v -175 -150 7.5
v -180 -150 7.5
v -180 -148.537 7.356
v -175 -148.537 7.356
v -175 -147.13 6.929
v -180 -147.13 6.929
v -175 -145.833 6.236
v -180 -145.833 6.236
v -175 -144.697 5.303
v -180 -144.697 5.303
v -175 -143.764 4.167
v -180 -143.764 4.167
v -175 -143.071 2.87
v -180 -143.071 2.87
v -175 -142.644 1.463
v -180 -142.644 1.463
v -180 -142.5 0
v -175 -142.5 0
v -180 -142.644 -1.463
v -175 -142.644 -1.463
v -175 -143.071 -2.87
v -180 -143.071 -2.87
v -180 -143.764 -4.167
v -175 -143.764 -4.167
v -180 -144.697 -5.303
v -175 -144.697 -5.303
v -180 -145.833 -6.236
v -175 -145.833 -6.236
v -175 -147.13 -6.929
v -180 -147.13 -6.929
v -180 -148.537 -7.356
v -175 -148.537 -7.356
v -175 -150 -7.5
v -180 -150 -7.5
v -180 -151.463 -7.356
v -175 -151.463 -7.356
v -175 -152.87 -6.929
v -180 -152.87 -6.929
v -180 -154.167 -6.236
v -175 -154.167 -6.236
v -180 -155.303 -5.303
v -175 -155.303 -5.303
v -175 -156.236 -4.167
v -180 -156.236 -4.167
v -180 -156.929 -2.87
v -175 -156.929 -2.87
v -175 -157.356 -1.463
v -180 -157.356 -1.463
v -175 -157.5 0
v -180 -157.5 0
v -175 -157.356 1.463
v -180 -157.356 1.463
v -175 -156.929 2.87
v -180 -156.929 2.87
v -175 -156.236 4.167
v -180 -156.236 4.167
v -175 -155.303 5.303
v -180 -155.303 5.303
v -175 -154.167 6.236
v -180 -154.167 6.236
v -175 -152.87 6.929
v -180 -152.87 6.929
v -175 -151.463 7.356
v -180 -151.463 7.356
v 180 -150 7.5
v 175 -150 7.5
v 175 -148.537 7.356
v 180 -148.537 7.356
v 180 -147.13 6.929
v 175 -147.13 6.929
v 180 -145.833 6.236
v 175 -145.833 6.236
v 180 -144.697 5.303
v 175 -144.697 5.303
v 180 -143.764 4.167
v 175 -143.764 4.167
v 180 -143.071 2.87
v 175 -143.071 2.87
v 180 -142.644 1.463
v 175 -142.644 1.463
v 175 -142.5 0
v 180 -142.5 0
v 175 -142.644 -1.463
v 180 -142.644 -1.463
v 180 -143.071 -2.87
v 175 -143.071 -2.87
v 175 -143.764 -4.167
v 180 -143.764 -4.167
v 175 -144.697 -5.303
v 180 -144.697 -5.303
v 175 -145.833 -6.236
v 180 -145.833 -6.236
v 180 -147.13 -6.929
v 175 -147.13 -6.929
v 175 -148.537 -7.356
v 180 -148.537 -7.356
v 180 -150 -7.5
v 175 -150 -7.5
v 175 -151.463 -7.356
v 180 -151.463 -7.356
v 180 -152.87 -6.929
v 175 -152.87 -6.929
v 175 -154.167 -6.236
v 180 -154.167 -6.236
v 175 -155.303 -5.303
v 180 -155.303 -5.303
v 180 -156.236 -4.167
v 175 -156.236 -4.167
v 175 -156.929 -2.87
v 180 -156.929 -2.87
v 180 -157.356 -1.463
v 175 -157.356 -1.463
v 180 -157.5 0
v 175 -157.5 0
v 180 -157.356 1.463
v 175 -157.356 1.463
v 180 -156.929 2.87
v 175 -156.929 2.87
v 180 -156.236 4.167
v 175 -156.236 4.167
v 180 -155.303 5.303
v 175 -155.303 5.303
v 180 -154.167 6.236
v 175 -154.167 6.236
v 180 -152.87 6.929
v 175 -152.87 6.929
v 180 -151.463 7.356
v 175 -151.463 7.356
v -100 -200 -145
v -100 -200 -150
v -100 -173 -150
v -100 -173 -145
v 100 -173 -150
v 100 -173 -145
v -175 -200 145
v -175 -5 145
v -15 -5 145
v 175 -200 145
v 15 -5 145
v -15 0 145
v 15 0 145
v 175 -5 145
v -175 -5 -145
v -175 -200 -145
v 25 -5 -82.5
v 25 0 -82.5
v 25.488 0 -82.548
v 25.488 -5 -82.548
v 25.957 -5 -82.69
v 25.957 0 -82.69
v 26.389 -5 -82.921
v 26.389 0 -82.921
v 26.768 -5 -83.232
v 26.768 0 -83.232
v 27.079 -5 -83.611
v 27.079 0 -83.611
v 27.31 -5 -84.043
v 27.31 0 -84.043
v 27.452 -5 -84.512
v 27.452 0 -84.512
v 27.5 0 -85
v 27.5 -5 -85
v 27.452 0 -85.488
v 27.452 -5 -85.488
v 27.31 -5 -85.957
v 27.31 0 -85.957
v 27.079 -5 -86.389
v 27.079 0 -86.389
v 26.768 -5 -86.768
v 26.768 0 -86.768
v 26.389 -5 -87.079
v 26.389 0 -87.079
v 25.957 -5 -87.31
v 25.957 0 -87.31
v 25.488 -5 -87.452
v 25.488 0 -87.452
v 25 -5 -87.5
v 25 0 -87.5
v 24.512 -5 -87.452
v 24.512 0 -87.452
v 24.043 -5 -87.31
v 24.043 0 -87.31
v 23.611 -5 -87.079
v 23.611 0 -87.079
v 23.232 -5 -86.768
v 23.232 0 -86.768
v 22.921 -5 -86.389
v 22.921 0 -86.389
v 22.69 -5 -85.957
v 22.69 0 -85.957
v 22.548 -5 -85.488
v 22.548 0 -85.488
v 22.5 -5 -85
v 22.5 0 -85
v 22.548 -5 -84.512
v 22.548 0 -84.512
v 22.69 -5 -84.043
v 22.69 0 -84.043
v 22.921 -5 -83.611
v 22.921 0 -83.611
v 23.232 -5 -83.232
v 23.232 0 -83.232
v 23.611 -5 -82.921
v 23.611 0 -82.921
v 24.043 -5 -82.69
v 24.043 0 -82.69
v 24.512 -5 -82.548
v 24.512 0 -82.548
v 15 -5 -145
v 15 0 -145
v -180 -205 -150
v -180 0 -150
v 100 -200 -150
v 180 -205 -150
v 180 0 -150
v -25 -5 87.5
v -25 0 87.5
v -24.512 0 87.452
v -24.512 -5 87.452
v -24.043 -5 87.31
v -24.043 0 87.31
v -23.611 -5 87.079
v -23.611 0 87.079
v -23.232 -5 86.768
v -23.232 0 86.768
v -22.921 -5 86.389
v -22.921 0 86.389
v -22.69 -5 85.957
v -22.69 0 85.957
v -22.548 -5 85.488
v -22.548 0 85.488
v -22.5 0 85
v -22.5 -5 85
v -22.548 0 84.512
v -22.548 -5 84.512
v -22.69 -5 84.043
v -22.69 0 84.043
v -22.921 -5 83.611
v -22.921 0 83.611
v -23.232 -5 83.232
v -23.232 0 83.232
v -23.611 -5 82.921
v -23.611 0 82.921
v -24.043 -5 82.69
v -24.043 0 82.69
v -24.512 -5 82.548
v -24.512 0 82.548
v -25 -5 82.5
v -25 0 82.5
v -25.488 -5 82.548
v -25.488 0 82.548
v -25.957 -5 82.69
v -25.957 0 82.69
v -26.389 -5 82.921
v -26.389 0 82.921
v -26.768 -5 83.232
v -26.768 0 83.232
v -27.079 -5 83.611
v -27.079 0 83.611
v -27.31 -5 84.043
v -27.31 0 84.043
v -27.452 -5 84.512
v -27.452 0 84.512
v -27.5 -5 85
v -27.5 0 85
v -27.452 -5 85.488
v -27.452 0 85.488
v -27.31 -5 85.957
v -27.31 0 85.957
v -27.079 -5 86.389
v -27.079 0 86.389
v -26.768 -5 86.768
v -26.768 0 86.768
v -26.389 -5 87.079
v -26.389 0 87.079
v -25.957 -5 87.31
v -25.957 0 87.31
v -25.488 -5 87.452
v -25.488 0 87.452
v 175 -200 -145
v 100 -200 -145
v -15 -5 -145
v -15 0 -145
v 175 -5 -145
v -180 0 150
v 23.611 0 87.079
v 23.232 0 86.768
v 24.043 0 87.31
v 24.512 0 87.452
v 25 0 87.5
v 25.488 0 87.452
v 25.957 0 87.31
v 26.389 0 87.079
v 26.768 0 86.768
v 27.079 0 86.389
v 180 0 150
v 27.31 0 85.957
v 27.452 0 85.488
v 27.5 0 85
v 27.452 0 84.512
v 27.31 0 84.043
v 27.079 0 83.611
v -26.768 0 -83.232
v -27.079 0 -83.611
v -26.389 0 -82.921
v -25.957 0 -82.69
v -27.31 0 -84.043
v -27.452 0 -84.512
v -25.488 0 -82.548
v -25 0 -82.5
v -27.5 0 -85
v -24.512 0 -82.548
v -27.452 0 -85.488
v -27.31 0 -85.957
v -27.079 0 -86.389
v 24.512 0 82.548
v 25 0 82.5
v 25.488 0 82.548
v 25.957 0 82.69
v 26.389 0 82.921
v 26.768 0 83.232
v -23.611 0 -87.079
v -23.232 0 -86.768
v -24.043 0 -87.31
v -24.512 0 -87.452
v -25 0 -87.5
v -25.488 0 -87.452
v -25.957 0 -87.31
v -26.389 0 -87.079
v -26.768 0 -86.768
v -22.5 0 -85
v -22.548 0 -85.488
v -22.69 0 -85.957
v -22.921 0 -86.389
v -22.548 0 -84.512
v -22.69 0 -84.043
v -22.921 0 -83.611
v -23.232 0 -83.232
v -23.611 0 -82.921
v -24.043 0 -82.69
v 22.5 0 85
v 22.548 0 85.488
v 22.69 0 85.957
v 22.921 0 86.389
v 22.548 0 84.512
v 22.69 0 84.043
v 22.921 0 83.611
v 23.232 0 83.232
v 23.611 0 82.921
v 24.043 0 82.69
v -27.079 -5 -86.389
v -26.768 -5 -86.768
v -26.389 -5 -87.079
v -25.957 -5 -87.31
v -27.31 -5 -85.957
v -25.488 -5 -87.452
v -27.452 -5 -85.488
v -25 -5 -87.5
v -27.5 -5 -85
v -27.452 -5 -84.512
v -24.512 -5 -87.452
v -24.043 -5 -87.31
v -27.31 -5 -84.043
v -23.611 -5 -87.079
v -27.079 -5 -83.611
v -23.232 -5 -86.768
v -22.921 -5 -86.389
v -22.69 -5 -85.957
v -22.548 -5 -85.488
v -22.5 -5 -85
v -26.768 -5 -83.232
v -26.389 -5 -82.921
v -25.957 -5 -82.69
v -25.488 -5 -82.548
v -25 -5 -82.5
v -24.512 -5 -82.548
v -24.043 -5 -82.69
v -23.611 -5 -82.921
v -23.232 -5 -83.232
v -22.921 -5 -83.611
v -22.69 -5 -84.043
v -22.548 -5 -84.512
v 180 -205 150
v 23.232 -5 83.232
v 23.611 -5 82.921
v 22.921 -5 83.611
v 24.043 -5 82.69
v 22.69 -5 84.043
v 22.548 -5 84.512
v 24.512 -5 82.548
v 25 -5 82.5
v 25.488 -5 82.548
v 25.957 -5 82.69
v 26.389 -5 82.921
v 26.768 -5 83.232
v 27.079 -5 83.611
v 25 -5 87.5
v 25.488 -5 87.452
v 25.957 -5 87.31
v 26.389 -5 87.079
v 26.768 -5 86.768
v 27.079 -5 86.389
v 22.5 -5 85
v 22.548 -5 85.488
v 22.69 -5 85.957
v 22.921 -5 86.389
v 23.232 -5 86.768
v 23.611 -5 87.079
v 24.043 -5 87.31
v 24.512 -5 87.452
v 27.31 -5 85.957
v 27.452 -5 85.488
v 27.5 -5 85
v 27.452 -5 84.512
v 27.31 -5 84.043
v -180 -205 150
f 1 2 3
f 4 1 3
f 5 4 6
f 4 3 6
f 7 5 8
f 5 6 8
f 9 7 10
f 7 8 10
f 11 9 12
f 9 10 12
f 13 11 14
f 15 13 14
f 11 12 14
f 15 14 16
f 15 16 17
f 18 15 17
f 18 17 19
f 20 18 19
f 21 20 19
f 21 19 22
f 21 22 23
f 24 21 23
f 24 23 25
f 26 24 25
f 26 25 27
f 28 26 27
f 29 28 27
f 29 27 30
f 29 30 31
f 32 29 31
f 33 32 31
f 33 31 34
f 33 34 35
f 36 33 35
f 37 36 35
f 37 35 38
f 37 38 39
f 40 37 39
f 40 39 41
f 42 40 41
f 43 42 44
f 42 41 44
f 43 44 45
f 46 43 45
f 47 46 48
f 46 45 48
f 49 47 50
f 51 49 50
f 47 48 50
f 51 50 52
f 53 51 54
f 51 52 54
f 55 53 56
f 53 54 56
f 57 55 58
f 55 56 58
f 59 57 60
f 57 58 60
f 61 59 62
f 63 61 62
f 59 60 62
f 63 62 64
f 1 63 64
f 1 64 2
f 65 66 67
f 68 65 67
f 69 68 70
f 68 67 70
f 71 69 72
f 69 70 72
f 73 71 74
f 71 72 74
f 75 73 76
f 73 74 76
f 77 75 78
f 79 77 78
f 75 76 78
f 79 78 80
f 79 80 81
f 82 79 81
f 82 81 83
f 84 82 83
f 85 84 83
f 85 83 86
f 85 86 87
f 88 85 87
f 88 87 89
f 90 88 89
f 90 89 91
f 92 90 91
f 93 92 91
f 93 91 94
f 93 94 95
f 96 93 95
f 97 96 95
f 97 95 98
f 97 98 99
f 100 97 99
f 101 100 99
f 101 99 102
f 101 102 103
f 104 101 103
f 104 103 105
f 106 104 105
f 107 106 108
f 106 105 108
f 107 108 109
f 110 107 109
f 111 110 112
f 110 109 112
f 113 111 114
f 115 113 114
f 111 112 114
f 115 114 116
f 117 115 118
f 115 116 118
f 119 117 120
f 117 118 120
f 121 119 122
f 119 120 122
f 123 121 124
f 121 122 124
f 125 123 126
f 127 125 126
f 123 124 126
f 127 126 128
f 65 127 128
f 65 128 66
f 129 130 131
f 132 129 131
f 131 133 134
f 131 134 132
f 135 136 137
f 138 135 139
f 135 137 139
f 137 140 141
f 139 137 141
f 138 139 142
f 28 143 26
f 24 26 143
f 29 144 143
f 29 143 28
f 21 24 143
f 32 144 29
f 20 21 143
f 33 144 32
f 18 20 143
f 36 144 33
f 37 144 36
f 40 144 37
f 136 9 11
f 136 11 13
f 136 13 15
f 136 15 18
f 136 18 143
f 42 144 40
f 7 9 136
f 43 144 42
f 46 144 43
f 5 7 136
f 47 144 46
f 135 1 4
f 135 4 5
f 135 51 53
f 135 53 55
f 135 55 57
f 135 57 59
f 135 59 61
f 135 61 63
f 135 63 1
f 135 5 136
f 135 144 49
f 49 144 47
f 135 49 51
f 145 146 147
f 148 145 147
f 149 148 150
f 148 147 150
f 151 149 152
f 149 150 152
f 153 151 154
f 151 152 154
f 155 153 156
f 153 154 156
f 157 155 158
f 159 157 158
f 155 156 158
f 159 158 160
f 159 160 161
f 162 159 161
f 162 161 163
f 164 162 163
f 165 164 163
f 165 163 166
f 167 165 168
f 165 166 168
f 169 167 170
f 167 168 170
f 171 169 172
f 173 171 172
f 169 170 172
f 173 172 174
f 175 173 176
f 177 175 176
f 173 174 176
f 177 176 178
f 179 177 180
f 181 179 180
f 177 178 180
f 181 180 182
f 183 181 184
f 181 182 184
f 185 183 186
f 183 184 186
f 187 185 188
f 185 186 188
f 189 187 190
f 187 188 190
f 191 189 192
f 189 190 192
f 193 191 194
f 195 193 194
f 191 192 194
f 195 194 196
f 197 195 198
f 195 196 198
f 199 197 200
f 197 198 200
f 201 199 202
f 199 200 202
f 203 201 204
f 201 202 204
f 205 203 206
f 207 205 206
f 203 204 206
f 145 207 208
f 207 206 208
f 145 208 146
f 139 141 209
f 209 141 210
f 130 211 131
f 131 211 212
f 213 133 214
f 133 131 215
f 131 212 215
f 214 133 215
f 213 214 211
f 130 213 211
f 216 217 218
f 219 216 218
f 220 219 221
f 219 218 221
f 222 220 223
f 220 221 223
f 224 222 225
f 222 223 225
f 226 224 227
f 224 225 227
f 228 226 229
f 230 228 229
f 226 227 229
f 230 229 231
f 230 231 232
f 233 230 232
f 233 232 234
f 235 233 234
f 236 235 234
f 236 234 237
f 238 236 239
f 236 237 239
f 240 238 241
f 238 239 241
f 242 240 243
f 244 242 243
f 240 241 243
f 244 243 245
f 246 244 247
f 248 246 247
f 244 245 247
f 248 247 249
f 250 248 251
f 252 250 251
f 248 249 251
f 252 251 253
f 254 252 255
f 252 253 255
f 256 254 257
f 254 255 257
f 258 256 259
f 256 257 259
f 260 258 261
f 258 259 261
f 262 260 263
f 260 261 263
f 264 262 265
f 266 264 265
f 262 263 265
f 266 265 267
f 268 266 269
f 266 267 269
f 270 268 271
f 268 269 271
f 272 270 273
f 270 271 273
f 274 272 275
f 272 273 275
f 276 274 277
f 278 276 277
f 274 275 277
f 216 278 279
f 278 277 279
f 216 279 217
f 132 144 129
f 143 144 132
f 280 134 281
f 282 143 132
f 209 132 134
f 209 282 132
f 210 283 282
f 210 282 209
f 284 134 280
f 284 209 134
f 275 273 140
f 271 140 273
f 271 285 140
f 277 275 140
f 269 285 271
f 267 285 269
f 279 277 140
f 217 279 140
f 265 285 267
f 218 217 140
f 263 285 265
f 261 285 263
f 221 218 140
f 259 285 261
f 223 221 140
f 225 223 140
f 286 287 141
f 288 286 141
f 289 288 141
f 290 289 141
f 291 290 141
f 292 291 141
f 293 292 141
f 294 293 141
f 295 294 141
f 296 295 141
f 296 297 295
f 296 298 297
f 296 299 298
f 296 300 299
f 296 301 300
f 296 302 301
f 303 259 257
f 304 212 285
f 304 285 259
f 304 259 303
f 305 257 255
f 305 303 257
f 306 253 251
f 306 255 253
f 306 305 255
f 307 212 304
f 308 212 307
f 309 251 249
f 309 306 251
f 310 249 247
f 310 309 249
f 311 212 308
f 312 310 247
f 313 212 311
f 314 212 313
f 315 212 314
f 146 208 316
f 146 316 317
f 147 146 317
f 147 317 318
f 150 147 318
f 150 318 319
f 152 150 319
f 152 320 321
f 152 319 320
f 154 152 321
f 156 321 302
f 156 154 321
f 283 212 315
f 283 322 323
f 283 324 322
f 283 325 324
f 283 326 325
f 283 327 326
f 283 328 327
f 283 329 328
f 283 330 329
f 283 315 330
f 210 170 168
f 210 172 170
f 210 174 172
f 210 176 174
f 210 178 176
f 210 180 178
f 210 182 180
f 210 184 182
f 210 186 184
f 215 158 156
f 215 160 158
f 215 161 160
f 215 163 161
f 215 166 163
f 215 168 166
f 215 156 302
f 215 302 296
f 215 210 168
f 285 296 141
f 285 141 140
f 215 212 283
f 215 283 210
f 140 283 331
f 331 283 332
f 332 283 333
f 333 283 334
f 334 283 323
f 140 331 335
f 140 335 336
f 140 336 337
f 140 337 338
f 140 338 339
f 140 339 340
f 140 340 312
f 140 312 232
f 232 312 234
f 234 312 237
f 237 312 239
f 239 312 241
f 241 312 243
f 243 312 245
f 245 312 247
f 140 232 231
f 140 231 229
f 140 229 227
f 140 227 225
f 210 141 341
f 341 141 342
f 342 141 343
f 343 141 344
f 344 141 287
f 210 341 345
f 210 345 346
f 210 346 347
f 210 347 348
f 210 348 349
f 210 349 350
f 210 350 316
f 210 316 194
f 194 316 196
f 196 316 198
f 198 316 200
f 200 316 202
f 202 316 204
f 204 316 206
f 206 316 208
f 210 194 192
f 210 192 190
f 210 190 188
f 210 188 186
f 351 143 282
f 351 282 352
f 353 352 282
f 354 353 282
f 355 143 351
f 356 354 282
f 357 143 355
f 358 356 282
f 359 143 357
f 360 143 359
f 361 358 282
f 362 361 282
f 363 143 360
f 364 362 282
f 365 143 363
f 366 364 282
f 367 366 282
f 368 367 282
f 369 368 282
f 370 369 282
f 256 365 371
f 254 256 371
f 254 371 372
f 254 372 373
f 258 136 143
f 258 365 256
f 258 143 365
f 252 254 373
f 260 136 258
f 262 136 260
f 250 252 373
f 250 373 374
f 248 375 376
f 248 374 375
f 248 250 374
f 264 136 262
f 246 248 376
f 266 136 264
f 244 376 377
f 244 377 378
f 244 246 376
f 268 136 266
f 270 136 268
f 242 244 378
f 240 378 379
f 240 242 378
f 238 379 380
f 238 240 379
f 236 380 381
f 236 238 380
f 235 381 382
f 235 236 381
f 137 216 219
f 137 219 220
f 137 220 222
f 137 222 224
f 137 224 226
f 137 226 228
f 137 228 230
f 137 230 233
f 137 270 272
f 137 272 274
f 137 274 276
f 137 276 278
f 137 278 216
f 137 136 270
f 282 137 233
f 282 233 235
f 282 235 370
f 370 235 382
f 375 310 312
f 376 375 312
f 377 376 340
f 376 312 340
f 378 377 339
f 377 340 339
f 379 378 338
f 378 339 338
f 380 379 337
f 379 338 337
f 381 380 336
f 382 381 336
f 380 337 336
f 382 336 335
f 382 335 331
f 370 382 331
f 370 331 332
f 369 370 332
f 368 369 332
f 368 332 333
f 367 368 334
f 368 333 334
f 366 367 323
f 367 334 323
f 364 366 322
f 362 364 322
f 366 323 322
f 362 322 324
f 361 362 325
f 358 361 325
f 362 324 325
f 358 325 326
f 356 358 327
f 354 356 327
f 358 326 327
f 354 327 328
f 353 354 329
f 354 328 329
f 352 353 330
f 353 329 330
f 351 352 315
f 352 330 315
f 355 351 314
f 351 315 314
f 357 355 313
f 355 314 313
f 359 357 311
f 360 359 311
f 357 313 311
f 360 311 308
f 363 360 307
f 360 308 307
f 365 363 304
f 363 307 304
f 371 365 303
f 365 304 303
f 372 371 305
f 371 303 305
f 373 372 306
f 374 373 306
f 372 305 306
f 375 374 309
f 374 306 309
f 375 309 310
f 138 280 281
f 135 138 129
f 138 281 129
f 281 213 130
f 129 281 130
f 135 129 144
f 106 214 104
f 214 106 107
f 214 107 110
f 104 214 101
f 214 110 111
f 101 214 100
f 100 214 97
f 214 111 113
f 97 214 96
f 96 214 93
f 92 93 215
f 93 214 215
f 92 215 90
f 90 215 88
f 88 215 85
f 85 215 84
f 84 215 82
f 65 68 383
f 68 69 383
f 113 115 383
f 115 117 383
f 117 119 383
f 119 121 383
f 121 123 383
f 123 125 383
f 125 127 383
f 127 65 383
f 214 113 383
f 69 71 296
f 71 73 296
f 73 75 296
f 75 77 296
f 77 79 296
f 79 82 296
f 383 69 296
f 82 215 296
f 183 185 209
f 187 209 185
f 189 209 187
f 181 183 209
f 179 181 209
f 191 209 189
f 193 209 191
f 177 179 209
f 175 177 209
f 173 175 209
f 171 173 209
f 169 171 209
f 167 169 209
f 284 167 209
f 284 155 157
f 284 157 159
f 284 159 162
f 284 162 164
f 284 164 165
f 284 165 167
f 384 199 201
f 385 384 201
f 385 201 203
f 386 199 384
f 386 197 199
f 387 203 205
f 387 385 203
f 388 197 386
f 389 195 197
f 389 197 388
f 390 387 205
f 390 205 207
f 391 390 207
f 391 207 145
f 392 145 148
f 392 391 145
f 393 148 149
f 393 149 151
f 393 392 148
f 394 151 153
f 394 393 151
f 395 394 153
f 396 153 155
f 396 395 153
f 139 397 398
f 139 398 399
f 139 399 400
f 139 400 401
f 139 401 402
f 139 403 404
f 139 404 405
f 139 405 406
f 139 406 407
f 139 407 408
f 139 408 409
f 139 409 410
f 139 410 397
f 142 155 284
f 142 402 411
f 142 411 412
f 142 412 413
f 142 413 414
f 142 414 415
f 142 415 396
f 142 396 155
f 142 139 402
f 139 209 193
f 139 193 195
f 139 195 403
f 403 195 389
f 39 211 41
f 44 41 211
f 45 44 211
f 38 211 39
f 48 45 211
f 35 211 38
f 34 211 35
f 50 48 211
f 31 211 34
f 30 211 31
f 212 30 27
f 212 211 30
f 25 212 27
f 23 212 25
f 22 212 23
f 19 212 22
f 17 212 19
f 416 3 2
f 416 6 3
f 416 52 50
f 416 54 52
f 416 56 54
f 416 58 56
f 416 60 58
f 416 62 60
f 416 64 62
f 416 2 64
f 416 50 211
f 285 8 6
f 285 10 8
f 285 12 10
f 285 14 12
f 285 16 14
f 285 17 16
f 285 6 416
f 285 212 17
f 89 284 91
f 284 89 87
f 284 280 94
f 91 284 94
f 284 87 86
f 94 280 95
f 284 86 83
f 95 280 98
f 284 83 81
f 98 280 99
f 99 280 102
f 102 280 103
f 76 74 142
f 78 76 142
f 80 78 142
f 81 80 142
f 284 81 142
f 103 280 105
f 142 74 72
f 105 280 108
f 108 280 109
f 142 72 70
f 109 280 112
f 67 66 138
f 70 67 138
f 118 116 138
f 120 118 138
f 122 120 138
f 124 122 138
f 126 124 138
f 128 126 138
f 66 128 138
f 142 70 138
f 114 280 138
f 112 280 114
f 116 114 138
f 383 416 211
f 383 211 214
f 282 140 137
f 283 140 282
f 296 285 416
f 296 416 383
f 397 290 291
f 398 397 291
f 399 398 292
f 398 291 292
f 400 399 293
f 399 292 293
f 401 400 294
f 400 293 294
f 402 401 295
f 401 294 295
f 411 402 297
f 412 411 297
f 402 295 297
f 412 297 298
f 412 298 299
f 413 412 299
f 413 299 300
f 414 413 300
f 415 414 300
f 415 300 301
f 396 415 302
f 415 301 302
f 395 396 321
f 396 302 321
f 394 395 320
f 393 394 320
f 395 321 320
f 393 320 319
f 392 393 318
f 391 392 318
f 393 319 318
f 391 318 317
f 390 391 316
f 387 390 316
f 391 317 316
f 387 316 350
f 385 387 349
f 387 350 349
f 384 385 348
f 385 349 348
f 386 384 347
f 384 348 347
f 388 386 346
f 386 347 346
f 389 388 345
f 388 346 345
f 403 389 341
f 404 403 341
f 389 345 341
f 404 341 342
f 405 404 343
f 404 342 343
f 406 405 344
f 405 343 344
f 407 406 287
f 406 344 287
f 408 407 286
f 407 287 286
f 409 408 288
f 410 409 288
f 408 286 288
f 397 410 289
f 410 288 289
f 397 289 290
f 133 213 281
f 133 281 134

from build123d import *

# Parameters (mm, degrees)
SKETCH1_W           = 360
SKETCH1_H           = 300
BOSS_EXTRUDE1_DEPTH = 200
SKETCH2_W           = 350
SKETCH2_H           = 290
CUT_EXTRUDE1_DEPTH  = 195
SKETCH3_W           = 30
SKETCH3_H           = 290
CUT_EXTRUDE2_DEPTH  = 309.058436015
SKETCH4_R           = 7.5
CUT_EXTRUDE3_DEPTH  = 439.292140016
SKETCH5_R           = 2.5
CUT_EXTRUDE4_DEPTH  = 5
SKETCH6_W           = 360
SKETCH6_H           = 300
BOSS_EXTRUDE2_DEPTH = 5
SKETCH7_W           = 200
SKETCH7_H           = 27
CUT_EXTRUDE5_DEPTH  = 5


with BuildPart() as part:
    # Sketch1 → Boss-Extrude1 (new body)
    with BuildSketch(Plane(origin=(0, 0, 0), x_dir=(1, 0, 0), z_dir=(0, 1, 0))):
        Rectangle(SKETCH1_W, SKETCH1_H)
    extrude(amount=-BOSS_EXTRUDE1_DEPTH)

    # Sketch2 → Cut-Extrude1 (cut)
    with BuildSketch(Plane.XZ.offset(200)):
        Rectangle(SKETCH2_W, SKETCH2_H)
    extrude(amount=-CUT_EXTRUDE1_DEPTH, mode=Mode.SUBTRACT)

    # Sketch3 → Cut-Extrude2 (cut, through all)
    with BuildSketch(Plane(origin=(0, 0, 0), x_dir=(1, 0, 0), z_dir=(0, 1, 0))):
        Rectangle(SKETCH3_W, SKETCH3_H)
    extrude(amount=-CUT_EXTRUDE2_DEPTH, mode=Mode.SUBTRACT)

    # Sketch4 → Cut-Extrude3 (cut, through all)
    with BuildSketch(Plane.ZY.offset(180)):
        with Locations((0, -150)):
            Circle(SKETCH4_R)
    extrude(amount=-CUT_EXTRUDE3_DEPTH, mode=Mode.SUBTRACT)

    # Sketch5 → Cut-Extrude4 (cut)
    with BuildSketch(Plane(origin=(0, 0, 0), x_dir=(1, 0, 0), z_dir=(0, 1, 0))):
        with Locations(Location((-25, 85, 0), (0, 0, 270))):
            Circle(SKETCH5_R)
        with Locations(Location((25, 85, 0), (0, 0, 270))):
            Circle(SKETCH5_R)
        with Locations(Location((25, -85, 0), (0, 0, 270))):
            Circle(SKETCH5_R)
        with Locations(Location((-25, -85, 0), (0, 0, 270))):
            Circle(SKETCH5_R)
    extrude(amount=-CUT_EXTRUDE4_DEPTH, mode=Mode.SUBTRACT)

    # Sketch6 → Boss-Extrude2 (add)
    with BuildSketch(Plane.XZ.offset(200)):
        Rectangle(SKETCH6_W, SKETCH6_H)
    extrude(amount=BOSS_EXTRUDE2_DEPTH)

    # Sketch7 → Cut-Extrude5 (cut)
    with BuildSketch(Plane(origin=(0, 0, -150), x_dir=(-1, 0, 0), z_dir=(0, 0, -1))):
        with Locations((0, -186.5)):
            Rectangle(SKETCH7_W, SKETCH7_H)
    extrude(amount=-CUT_EXTRUDE5_DEPTH, mode=Mode.SUBTRACT)


solid = part.part
